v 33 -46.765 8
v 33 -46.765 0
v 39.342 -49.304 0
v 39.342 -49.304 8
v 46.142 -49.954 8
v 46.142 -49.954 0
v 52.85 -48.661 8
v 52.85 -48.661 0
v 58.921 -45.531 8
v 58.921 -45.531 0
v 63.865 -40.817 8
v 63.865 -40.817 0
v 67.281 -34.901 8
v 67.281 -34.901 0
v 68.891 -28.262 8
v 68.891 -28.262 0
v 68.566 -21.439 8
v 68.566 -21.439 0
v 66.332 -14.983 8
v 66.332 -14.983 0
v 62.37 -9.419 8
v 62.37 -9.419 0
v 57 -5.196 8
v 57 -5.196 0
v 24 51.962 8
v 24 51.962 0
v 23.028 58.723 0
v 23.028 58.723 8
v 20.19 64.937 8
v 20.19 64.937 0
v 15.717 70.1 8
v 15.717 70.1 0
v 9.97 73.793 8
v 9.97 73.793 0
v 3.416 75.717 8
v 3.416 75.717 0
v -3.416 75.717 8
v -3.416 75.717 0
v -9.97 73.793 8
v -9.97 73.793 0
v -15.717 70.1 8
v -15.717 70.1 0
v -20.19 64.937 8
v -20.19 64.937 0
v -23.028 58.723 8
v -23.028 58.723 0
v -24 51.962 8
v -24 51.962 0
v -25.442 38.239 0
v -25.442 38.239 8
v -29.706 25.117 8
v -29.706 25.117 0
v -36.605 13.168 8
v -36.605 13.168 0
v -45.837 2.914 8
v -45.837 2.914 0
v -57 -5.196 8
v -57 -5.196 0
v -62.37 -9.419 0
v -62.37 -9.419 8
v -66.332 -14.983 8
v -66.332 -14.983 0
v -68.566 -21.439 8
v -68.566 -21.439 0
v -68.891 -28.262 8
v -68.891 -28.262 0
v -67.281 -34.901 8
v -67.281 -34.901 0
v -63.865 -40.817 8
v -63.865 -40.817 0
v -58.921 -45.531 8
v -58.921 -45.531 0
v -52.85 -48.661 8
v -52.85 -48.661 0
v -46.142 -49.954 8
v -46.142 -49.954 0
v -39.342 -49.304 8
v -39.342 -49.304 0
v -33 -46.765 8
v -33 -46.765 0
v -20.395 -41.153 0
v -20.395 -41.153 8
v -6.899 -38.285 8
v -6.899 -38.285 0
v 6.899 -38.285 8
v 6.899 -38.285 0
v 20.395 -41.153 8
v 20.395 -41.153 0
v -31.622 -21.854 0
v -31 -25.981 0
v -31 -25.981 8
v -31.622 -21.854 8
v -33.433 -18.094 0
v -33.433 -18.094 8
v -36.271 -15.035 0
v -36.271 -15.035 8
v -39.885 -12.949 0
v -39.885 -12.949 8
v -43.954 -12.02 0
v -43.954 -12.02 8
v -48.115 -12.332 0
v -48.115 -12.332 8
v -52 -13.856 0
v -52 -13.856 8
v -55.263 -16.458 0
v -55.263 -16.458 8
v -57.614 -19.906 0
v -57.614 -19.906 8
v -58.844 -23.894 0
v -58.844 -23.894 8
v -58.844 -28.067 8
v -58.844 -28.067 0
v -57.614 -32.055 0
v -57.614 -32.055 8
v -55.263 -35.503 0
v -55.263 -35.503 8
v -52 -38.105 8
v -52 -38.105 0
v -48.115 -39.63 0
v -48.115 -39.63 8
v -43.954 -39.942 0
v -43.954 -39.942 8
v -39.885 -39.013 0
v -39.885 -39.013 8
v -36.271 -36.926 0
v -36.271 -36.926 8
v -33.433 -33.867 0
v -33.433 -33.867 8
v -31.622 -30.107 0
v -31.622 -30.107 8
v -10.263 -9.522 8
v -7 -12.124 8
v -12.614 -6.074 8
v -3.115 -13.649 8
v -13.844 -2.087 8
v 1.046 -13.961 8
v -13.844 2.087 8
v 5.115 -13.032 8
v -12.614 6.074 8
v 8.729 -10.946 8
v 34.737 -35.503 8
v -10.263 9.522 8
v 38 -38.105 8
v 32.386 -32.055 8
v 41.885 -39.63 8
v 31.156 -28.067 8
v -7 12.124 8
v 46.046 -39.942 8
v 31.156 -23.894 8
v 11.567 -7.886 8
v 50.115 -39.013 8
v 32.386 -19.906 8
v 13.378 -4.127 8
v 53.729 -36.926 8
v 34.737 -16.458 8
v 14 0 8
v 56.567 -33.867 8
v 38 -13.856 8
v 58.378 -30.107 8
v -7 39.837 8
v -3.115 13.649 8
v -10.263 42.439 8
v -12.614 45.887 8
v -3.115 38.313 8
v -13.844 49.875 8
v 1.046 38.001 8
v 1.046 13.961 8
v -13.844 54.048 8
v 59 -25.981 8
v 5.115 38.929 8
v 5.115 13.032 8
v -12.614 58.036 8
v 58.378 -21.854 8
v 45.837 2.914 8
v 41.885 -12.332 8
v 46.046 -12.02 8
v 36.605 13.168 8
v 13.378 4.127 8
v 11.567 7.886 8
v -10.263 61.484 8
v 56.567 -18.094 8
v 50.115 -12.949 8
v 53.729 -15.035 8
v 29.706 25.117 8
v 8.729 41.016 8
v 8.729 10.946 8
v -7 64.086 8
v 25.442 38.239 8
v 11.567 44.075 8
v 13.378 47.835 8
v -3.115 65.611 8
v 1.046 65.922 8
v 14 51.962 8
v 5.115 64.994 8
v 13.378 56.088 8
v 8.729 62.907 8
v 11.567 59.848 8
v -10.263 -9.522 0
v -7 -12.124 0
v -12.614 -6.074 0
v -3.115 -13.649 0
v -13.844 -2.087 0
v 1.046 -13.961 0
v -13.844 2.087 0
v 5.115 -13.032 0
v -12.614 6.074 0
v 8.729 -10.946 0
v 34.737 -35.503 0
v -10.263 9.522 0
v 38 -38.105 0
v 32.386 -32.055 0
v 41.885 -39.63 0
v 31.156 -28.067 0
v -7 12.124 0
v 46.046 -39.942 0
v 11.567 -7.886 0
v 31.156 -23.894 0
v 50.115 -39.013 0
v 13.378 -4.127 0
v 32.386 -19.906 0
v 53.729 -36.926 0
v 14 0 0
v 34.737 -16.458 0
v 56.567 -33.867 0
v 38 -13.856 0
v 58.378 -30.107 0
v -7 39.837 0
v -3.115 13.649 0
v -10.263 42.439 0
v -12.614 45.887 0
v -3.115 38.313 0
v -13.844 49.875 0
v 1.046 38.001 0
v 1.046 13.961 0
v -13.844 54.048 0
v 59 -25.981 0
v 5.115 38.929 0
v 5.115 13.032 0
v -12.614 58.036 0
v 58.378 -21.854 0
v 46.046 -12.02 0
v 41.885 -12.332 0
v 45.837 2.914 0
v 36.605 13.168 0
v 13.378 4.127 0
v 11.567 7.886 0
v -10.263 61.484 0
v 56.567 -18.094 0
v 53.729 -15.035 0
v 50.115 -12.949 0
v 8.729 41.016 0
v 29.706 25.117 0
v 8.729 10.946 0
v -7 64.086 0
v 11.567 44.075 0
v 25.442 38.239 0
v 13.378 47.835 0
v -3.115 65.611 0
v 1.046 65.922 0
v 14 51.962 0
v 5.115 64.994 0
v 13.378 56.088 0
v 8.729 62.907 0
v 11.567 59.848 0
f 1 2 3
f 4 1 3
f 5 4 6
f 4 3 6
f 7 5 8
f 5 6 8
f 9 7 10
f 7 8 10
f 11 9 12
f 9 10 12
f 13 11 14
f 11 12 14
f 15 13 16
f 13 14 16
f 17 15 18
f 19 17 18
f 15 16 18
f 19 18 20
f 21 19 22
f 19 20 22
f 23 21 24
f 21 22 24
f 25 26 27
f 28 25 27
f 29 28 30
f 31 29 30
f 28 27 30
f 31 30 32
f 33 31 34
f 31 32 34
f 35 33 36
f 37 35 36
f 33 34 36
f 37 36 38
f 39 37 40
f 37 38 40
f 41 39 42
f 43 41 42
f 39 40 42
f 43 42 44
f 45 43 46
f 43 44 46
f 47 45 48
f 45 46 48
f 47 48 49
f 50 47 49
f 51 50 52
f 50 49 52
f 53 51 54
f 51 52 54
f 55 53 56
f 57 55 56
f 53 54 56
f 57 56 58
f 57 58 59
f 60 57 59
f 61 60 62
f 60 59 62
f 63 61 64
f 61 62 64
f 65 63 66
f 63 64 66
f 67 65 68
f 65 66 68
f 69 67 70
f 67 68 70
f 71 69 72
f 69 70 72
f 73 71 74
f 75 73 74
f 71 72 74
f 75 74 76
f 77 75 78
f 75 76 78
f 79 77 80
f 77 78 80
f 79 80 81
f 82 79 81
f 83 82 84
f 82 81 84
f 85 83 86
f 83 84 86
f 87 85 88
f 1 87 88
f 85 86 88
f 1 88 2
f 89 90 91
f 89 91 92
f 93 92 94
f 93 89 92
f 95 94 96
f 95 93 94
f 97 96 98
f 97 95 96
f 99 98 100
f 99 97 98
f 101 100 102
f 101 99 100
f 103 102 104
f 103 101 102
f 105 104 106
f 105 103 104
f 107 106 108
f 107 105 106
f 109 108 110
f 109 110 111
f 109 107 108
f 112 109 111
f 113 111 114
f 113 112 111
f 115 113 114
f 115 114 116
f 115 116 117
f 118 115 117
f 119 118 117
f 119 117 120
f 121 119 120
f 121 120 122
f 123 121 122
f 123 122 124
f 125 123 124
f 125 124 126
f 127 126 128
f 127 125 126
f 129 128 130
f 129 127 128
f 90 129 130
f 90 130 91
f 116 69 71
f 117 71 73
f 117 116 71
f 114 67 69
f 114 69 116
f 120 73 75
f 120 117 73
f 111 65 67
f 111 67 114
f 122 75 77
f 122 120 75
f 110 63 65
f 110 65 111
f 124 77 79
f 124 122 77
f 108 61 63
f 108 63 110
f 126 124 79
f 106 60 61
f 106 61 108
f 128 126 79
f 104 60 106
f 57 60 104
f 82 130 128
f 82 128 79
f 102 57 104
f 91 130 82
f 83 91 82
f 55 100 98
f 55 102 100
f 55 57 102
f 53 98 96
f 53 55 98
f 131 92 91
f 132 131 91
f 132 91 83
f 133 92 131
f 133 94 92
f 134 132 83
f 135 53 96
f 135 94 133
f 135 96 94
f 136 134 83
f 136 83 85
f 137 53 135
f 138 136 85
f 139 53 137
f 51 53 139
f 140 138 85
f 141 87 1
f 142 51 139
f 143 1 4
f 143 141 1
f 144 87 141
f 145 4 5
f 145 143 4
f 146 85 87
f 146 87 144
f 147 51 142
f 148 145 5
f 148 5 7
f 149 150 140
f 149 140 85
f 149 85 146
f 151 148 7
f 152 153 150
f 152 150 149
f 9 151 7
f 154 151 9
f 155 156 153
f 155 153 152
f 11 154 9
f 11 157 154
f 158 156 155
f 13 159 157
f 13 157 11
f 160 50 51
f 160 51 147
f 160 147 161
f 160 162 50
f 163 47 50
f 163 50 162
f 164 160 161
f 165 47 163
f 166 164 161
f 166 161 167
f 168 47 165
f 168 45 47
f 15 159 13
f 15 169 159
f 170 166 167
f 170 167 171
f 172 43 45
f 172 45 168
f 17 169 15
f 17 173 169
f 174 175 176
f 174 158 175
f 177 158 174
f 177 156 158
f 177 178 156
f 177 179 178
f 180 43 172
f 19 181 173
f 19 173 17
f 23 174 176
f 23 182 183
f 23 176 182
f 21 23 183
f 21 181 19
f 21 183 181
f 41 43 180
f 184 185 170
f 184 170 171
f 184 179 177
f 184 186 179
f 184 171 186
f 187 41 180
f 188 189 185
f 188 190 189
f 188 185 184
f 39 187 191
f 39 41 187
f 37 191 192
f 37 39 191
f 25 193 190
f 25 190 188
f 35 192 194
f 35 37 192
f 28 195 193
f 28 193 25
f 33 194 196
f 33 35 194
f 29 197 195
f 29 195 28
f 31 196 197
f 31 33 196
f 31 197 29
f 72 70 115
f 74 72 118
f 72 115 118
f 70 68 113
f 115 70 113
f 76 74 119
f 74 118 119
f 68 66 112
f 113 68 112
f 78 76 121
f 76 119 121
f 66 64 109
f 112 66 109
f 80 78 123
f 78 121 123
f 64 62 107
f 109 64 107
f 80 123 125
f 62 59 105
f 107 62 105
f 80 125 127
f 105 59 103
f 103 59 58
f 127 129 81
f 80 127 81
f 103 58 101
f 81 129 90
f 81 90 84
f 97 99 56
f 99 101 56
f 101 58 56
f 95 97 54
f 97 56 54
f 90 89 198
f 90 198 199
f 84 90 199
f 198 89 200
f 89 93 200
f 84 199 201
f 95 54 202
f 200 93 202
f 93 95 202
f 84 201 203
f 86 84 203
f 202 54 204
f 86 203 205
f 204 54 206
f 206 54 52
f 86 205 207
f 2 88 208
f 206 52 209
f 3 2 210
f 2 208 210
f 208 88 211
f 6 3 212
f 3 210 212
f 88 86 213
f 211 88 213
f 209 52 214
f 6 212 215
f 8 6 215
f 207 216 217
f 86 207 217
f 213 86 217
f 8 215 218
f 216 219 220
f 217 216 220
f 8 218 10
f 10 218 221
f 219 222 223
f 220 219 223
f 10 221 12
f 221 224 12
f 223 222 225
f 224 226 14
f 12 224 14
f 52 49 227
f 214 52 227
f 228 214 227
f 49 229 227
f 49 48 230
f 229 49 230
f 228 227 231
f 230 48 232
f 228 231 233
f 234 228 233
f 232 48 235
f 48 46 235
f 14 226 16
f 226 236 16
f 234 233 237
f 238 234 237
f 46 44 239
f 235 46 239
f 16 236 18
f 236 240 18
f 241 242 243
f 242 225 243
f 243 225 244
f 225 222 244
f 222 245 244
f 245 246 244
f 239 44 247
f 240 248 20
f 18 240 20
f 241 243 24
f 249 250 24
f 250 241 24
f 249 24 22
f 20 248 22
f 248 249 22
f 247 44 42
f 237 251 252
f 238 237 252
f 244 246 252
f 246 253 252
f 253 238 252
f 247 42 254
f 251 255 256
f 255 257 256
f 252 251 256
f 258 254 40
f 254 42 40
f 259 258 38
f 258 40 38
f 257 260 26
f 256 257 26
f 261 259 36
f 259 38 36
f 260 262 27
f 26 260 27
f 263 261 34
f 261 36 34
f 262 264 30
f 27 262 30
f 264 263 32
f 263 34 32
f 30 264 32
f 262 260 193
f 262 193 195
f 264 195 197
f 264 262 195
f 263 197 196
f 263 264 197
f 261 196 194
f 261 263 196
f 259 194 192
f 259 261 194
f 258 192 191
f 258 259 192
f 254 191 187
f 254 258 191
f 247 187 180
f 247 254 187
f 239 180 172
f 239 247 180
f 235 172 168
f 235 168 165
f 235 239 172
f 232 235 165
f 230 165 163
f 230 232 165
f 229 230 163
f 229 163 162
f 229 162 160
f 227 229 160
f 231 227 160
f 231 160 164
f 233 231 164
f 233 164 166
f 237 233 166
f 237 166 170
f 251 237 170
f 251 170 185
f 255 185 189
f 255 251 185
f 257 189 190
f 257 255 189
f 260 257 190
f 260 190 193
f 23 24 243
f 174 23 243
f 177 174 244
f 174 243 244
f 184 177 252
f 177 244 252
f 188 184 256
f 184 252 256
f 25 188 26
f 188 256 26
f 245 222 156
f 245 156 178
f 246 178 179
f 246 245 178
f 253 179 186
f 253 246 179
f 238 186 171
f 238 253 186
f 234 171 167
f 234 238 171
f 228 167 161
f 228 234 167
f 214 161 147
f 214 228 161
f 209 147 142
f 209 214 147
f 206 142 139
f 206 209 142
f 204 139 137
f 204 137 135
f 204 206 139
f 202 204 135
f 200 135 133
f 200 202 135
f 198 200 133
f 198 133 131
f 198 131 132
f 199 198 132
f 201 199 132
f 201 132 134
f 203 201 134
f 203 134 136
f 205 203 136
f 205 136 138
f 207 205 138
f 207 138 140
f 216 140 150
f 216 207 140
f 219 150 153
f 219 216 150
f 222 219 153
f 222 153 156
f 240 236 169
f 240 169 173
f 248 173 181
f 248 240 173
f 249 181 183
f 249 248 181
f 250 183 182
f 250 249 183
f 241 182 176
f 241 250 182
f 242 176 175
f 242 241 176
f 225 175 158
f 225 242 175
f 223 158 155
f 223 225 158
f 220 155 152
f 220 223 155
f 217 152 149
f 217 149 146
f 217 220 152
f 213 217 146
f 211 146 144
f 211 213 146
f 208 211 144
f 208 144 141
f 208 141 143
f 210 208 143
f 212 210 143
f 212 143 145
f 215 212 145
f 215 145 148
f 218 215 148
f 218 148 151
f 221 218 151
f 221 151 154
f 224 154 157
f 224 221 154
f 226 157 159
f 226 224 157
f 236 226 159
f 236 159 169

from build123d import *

# Parameters (mm, degrees)
F0_R     = 14
F1_DEPTH = 8


with BuildPart() as f1:
    # F0 (on Top) → F1 (new body)
    with BuildSketch(Plane.XY):
        with BuildLine():
            ThreePointArc((57, -5.196152), (32.842323, 18.961524), (24, 51.961524))
            ThreePointArc((24, 51.961524), (0, 75.961524), (-24, 51.961524))
            ThreePointArc((-24, 51.961524), (-32.842323, 18.961524), (-57, -5.196152))
            ThreePointArc((-57, -5.196152), (-65.78461, -37.980762), (-33, -46.765372))
            ThreePointArc((-33, -46.765372), (0, -37.923048), (33, -46.765372))
            ThreePointArc((33, -46.765372), (65.78461, -37.980762), (57, -5.196152))
        make_face()
        with Locations((-45, -25.980762)):
            Circle(F0_R, mode=Mode.SUBTRACT)
        Circle(F0_R, mode=Mode.SUBTRACT)
        with Locations((45, -25.980762)):
            Circle(F0_R, mode=Mode.SUBTRACT)
        with Locations((0, 51.961524)):
            Circle(F0_R, mode=Mode.SUBTRACT)
    extrude(amount=F1_DEPTH)


solid = f1.part
